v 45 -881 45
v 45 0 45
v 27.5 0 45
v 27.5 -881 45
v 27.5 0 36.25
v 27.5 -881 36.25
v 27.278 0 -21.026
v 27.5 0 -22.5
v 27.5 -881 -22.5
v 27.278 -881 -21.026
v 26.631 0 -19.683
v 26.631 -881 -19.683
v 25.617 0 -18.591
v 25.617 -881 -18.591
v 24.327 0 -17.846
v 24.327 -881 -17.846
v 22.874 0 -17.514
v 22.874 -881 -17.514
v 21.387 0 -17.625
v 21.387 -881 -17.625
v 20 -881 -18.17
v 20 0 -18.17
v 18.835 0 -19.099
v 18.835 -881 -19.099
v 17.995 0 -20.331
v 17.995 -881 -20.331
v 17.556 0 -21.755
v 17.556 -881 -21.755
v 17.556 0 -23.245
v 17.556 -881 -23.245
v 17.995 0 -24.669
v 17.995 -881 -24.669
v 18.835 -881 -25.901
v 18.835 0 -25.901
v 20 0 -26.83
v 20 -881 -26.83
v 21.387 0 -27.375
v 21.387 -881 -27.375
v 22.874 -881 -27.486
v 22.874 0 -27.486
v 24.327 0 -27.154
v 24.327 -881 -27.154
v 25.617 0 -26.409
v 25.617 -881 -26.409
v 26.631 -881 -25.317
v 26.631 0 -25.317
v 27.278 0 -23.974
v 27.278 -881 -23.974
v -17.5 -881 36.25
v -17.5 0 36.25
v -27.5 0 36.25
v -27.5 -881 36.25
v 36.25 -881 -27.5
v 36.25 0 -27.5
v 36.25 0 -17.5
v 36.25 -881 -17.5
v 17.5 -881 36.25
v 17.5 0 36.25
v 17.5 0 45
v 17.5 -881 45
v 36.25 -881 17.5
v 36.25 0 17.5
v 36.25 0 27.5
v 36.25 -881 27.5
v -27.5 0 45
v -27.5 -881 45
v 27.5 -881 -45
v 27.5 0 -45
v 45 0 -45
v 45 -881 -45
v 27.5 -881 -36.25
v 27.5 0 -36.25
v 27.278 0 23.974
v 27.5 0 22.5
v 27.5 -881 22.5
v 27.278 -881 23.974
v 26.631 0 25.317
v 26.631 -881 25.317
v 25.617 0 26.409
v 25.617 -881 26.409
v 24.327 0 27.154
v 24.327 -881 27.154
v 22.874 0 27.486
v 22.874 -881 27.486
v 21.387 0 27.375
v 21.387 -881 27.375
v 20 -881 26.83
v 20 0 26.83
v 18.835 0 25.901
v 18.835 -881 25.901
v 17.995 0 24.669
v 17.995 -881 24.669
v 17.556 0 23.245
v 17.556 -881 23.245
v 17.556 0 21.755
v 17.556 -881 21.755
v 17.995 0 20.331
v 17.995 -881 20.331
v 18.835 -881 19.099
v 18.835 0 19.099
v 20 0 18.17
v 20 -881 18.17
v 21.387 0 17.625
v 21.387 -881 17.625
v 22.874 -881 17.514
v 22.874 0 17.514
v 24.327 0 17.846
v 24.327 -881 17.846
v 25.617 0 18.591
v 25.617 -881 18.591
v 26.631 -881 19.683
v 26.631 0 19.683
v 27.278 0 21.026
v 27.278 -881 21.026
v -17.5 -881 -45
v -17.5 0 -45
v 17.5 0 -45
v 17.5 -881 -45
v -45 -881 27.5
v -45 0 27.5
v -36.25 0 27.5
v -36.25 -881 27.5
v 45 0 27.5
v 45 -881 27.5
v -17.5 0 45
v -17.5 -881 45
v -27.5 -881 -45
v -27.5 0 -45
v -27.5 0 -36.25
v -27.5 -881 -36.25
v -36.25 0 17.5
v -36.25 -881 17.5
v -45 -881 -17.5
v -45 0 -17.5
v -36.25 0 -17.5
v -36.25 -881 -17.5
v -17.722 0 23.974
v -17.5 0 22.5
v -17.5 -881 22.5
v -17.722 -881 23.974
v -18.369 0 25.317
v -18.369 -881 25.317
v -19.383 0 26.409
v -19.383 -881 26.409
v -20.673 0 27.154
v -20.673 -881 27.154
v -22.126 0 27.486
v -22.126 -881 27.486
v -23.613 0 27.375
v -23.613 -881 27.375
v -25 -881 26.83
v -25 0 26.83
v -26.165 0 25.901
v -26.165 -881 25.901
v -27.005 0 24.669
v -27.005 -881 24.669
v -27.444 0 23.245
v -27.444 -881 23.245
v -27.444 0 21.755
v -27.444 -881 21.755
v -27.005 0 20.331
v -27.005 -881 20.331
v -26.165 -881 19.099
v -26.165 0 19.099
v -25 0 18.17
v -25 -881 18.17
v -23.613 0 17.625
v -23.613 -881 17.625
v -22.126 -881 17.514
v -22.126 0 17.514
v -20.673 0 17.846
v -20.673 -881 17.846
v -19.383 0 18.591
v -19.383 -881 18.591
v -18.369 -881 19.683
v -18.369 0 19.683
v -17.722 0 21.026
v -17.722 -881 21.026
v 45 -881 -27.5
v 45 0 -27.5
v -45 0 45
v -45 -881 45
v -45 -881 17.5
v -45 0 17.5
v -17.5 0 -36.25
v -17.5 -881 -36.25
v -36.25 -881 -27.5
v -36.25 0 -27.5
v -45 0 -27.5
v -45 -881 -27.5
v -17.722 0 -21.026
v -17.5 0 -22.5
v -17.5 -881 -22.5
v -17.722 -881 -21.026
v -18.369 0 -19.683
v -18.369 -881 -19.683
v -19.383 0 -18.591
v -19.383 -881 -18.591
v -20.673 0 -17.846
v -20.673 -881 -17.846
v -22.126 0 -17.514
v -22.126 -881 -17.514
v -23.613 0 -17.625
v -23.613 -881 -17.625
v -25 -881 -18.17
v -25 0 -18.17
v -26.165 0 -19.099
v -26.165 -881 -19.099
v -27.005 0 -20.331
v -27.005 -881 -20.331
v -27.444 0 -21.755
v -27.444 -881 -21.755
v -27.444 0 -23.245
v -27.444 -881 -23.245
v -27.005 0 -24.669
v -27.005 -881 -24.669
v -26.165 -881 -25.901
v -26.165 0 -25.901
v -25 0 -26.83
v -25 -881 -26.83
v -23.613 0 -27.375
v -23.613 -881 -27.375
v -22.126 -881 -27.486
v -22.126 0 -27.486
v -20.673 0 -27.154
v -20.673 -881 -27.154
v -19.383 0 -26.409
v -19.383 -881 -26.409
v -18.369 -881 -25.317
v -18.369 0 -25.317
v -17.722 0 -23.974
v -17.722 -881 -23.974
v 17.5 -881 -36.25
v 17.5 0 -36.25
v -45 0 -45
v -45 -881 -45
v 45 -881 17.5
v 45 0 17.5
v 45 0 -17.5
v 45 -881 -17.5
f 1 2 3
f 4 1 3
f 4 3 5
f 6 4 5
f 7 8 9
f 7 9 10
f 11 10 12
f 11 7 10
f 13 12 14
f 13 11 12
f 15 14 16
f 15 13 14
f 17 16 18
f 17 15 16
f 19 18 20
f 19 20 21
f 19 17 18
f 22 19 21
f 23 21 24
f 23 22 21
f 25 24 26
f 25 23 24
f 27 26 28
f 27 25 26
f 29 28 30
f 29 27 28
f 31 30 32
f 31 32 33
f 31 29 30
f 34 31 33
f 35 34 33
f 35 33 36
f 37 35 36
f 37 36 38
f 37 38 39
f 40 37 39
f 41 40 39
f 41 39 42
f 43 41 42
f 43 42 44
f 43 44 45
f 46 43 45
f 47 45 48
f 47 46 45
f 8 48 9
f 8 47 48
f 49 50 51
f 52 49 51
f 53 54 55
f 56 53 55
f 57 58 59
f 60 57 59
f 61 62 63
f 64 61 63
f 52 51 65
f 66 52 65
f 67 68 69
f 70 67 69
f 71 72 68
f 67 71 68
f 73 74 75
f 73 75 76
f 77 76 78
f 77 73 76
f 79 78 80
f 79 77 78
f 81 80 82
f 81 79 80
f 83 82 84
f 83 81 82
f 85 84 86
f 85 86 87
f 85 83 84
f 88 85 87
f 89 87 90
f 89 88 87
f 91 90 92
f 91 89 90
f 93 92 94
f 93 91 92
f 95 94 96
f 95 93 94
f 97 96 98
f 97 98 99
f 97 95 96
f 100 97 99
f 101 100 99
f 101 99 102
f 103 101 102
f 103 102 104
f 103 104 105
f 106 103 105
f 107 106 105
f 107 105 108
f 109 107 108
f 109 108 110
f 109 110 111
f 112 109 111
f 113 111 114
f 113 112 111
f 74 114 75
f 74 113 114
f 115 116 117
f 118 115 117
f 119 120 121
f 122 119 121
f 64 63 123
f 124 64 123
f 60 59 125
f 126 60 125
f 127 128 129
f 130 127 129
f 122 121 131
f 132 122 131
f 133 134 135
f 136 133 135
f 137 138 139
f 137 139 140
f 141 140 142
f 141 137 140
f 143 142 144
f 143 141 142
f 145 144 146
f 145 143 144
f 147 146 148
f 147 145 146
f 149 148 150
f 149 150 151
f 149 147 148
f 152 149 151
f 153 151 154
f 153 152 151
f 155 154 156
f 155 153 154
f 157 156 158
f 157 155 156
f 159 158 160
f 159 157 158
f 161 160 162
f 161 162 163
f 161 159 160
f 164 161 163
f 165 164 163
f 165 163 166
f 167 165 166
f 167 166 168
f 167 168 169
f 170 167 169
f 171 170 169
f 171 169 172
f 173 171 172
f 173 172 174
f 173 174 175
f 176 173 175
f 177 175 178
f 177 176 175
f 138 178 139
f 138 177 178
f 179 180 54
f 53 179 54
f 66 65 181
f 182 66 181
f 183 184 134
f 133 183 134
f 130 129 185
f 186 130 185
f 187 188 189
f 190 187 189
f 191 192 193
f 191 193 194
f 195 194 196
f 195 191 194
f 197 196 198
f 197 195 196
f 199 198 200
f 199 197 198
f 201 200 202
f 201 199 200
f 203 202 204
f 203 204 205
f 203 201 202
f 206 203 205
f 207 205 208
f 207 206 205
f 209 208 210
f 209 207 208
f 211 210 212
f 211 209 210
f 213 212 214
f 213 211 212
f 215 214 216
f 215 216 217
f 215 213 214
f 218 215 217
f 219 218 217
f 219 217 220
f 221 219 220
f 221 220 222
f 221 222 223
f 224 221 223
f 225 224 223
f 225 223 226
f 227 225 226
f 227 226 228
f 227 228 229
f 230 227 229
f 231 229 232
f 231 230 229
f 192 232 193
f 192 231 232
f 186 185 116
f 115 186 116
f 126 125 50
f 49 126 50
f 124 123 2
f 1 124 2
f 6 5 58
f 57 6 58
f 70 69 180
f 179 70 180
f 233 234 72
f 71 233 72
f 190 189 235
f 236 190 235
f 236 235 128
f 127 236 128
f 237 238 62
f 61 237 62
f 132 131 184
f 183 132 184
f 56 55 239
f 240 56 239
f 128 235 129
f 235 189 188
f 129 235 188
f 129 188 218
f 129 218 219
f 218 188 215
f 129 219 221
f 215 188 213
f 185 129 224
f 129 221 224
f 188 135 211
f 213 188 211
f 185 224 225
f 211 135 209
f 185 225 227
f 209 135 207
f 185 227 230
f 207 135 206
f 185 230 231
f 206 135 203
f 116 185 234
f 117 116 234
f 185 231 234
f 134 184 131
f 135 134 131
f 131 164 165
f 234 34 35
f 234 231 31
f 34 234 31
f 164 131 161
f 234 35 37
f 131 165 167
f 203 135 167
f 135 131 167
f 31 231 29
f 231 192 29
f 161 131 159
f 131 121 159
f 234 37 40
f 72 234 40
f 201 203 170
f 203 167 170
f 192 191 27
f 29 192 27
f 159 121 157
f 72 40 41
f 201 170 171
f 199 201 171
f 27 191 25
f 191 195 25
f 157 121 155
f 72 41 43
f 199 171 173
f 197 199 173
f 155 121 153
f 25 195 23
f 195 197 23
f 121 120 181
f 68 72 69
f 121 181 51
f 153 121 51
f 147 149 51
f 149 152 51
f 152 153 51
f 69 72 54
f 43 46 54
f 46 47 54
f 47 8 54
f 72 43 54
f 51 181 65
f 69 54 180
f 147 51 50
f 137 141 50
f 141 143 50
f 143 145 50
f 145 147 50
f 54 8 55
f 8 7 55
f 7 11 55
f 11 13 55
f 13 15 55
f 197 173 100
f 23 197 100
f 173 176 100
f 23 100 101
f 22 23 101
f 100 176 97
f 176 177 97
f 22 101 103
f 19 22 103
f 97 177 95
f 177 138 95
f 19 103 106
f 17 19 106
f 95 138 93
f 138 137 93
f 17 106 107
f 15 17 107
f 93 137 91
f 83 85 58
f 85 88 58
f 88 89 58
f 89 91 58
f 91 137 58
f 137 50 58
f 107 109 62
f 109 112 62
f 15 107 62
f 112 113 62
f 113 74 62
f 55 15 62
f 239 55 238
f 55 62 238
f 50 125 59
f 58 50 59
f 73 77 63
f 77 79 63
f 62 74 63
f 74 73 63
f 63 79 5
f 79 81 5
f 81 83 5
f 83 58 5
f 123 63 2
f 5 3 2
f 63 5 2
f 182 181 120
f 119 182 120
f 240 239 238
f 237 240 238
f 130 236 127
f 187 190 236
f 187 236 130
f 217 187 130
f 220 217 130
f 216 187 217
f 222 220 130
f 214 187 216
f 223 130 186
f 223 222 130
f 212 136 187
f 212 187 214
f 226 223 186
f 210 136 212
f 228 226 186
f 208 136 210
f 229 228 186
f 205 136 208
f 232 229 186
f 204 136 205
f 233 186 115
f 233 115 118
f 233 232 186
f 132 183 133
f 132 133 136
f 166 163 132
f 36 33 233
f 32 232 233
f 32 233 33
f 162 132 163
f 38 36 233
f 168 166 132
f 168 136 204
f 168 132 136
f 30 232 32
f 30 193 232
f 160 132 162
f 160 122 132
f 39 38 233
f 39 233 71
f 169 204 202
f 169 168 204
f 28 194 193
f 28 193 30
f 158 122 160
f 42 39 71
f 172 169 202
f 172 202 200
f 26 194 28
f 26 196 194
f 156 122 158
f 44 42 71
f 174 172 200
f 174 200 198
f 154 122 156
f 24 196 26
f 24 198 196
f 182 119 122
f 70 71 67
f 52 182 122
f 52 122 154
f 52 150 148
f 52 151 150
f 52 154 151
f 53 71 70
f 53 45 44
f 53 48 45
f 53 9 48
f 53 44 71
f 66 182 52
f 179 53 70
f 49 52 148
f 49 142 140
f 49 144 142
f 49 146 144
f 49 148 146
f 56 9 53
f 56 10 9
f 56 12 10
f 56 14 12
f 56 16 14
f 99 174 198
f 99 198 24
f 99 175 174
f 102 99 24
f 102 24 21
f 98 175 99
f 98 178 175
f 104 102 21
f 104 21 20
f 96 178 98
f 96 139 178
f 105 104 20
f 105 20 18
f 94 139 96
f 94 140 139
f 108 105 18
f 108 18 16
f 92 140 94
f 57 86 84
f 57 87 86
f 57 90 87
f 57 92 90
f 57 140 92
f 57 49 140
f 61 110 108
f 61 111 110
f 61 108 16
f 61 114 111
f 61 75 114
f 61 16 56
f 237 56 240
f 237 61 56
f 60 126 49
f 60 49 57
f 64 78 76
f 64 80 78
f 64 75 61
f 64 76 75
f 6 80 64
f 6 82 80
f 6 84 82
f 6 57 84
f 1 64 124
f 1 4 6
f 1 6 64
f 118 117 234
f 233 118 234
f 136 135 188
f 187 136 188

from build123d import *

# Parameters (mm, degrees)
F0_R     = 5
F1_DEPTH = 881


with BuildPart() as f1:
    # F0 (on Front) → F1 (new body)
    with BuildSketch(Plane.XZ):
        Polygon((36.25, -45), (45, -45), (45, -27.5), (36.25, -27.5), (36.25, -17.5), (45, -17.5), (45, 17.5), (36.25, 17.5), (36.25, 27.5), (45, 27.5), (45, 45), (27.5, 45), (27.5, 36.25), (17.5, 36.25), (17.5, 45), (-17.5, 45), (-17.5, 36.25), (-27.5, 36.25), (-27.5, 45), (-45, 45), (-45, 27.5), (-36.25, 27.5), (-36.25, 17.5), (-45, 17.5), (-45, -17.5), (-36.25, -17.5), (-36.25, -27.5), (-45, -27.5), (-45, -45), (-27.5, -45), (-27.5, -36.25), (-17.5, -36.25), (-17.5, -45), (17.5, -45), (17.5, -36.25), (27.5, -36.25), (27.5, -45), align=None)
        with Locations((-22.5, -22.5)):
            Circle(F0_R, mode=Mode.SUBTRACT)
        with Locations((22.5, -22.5)):
            Circle(F0_R, mode=Mode.SUBTRACT)
        with Locations((-22.5, 22.5)):
            Circle(F0_R, mode=Mode.SUBTRACT)
        with Locations((22.5, 22.5)):
            Circle(F0_R, mode=Mode.SUBTRACT)
    extrude(amount=F1_DEPTH)


solid = f1.part
